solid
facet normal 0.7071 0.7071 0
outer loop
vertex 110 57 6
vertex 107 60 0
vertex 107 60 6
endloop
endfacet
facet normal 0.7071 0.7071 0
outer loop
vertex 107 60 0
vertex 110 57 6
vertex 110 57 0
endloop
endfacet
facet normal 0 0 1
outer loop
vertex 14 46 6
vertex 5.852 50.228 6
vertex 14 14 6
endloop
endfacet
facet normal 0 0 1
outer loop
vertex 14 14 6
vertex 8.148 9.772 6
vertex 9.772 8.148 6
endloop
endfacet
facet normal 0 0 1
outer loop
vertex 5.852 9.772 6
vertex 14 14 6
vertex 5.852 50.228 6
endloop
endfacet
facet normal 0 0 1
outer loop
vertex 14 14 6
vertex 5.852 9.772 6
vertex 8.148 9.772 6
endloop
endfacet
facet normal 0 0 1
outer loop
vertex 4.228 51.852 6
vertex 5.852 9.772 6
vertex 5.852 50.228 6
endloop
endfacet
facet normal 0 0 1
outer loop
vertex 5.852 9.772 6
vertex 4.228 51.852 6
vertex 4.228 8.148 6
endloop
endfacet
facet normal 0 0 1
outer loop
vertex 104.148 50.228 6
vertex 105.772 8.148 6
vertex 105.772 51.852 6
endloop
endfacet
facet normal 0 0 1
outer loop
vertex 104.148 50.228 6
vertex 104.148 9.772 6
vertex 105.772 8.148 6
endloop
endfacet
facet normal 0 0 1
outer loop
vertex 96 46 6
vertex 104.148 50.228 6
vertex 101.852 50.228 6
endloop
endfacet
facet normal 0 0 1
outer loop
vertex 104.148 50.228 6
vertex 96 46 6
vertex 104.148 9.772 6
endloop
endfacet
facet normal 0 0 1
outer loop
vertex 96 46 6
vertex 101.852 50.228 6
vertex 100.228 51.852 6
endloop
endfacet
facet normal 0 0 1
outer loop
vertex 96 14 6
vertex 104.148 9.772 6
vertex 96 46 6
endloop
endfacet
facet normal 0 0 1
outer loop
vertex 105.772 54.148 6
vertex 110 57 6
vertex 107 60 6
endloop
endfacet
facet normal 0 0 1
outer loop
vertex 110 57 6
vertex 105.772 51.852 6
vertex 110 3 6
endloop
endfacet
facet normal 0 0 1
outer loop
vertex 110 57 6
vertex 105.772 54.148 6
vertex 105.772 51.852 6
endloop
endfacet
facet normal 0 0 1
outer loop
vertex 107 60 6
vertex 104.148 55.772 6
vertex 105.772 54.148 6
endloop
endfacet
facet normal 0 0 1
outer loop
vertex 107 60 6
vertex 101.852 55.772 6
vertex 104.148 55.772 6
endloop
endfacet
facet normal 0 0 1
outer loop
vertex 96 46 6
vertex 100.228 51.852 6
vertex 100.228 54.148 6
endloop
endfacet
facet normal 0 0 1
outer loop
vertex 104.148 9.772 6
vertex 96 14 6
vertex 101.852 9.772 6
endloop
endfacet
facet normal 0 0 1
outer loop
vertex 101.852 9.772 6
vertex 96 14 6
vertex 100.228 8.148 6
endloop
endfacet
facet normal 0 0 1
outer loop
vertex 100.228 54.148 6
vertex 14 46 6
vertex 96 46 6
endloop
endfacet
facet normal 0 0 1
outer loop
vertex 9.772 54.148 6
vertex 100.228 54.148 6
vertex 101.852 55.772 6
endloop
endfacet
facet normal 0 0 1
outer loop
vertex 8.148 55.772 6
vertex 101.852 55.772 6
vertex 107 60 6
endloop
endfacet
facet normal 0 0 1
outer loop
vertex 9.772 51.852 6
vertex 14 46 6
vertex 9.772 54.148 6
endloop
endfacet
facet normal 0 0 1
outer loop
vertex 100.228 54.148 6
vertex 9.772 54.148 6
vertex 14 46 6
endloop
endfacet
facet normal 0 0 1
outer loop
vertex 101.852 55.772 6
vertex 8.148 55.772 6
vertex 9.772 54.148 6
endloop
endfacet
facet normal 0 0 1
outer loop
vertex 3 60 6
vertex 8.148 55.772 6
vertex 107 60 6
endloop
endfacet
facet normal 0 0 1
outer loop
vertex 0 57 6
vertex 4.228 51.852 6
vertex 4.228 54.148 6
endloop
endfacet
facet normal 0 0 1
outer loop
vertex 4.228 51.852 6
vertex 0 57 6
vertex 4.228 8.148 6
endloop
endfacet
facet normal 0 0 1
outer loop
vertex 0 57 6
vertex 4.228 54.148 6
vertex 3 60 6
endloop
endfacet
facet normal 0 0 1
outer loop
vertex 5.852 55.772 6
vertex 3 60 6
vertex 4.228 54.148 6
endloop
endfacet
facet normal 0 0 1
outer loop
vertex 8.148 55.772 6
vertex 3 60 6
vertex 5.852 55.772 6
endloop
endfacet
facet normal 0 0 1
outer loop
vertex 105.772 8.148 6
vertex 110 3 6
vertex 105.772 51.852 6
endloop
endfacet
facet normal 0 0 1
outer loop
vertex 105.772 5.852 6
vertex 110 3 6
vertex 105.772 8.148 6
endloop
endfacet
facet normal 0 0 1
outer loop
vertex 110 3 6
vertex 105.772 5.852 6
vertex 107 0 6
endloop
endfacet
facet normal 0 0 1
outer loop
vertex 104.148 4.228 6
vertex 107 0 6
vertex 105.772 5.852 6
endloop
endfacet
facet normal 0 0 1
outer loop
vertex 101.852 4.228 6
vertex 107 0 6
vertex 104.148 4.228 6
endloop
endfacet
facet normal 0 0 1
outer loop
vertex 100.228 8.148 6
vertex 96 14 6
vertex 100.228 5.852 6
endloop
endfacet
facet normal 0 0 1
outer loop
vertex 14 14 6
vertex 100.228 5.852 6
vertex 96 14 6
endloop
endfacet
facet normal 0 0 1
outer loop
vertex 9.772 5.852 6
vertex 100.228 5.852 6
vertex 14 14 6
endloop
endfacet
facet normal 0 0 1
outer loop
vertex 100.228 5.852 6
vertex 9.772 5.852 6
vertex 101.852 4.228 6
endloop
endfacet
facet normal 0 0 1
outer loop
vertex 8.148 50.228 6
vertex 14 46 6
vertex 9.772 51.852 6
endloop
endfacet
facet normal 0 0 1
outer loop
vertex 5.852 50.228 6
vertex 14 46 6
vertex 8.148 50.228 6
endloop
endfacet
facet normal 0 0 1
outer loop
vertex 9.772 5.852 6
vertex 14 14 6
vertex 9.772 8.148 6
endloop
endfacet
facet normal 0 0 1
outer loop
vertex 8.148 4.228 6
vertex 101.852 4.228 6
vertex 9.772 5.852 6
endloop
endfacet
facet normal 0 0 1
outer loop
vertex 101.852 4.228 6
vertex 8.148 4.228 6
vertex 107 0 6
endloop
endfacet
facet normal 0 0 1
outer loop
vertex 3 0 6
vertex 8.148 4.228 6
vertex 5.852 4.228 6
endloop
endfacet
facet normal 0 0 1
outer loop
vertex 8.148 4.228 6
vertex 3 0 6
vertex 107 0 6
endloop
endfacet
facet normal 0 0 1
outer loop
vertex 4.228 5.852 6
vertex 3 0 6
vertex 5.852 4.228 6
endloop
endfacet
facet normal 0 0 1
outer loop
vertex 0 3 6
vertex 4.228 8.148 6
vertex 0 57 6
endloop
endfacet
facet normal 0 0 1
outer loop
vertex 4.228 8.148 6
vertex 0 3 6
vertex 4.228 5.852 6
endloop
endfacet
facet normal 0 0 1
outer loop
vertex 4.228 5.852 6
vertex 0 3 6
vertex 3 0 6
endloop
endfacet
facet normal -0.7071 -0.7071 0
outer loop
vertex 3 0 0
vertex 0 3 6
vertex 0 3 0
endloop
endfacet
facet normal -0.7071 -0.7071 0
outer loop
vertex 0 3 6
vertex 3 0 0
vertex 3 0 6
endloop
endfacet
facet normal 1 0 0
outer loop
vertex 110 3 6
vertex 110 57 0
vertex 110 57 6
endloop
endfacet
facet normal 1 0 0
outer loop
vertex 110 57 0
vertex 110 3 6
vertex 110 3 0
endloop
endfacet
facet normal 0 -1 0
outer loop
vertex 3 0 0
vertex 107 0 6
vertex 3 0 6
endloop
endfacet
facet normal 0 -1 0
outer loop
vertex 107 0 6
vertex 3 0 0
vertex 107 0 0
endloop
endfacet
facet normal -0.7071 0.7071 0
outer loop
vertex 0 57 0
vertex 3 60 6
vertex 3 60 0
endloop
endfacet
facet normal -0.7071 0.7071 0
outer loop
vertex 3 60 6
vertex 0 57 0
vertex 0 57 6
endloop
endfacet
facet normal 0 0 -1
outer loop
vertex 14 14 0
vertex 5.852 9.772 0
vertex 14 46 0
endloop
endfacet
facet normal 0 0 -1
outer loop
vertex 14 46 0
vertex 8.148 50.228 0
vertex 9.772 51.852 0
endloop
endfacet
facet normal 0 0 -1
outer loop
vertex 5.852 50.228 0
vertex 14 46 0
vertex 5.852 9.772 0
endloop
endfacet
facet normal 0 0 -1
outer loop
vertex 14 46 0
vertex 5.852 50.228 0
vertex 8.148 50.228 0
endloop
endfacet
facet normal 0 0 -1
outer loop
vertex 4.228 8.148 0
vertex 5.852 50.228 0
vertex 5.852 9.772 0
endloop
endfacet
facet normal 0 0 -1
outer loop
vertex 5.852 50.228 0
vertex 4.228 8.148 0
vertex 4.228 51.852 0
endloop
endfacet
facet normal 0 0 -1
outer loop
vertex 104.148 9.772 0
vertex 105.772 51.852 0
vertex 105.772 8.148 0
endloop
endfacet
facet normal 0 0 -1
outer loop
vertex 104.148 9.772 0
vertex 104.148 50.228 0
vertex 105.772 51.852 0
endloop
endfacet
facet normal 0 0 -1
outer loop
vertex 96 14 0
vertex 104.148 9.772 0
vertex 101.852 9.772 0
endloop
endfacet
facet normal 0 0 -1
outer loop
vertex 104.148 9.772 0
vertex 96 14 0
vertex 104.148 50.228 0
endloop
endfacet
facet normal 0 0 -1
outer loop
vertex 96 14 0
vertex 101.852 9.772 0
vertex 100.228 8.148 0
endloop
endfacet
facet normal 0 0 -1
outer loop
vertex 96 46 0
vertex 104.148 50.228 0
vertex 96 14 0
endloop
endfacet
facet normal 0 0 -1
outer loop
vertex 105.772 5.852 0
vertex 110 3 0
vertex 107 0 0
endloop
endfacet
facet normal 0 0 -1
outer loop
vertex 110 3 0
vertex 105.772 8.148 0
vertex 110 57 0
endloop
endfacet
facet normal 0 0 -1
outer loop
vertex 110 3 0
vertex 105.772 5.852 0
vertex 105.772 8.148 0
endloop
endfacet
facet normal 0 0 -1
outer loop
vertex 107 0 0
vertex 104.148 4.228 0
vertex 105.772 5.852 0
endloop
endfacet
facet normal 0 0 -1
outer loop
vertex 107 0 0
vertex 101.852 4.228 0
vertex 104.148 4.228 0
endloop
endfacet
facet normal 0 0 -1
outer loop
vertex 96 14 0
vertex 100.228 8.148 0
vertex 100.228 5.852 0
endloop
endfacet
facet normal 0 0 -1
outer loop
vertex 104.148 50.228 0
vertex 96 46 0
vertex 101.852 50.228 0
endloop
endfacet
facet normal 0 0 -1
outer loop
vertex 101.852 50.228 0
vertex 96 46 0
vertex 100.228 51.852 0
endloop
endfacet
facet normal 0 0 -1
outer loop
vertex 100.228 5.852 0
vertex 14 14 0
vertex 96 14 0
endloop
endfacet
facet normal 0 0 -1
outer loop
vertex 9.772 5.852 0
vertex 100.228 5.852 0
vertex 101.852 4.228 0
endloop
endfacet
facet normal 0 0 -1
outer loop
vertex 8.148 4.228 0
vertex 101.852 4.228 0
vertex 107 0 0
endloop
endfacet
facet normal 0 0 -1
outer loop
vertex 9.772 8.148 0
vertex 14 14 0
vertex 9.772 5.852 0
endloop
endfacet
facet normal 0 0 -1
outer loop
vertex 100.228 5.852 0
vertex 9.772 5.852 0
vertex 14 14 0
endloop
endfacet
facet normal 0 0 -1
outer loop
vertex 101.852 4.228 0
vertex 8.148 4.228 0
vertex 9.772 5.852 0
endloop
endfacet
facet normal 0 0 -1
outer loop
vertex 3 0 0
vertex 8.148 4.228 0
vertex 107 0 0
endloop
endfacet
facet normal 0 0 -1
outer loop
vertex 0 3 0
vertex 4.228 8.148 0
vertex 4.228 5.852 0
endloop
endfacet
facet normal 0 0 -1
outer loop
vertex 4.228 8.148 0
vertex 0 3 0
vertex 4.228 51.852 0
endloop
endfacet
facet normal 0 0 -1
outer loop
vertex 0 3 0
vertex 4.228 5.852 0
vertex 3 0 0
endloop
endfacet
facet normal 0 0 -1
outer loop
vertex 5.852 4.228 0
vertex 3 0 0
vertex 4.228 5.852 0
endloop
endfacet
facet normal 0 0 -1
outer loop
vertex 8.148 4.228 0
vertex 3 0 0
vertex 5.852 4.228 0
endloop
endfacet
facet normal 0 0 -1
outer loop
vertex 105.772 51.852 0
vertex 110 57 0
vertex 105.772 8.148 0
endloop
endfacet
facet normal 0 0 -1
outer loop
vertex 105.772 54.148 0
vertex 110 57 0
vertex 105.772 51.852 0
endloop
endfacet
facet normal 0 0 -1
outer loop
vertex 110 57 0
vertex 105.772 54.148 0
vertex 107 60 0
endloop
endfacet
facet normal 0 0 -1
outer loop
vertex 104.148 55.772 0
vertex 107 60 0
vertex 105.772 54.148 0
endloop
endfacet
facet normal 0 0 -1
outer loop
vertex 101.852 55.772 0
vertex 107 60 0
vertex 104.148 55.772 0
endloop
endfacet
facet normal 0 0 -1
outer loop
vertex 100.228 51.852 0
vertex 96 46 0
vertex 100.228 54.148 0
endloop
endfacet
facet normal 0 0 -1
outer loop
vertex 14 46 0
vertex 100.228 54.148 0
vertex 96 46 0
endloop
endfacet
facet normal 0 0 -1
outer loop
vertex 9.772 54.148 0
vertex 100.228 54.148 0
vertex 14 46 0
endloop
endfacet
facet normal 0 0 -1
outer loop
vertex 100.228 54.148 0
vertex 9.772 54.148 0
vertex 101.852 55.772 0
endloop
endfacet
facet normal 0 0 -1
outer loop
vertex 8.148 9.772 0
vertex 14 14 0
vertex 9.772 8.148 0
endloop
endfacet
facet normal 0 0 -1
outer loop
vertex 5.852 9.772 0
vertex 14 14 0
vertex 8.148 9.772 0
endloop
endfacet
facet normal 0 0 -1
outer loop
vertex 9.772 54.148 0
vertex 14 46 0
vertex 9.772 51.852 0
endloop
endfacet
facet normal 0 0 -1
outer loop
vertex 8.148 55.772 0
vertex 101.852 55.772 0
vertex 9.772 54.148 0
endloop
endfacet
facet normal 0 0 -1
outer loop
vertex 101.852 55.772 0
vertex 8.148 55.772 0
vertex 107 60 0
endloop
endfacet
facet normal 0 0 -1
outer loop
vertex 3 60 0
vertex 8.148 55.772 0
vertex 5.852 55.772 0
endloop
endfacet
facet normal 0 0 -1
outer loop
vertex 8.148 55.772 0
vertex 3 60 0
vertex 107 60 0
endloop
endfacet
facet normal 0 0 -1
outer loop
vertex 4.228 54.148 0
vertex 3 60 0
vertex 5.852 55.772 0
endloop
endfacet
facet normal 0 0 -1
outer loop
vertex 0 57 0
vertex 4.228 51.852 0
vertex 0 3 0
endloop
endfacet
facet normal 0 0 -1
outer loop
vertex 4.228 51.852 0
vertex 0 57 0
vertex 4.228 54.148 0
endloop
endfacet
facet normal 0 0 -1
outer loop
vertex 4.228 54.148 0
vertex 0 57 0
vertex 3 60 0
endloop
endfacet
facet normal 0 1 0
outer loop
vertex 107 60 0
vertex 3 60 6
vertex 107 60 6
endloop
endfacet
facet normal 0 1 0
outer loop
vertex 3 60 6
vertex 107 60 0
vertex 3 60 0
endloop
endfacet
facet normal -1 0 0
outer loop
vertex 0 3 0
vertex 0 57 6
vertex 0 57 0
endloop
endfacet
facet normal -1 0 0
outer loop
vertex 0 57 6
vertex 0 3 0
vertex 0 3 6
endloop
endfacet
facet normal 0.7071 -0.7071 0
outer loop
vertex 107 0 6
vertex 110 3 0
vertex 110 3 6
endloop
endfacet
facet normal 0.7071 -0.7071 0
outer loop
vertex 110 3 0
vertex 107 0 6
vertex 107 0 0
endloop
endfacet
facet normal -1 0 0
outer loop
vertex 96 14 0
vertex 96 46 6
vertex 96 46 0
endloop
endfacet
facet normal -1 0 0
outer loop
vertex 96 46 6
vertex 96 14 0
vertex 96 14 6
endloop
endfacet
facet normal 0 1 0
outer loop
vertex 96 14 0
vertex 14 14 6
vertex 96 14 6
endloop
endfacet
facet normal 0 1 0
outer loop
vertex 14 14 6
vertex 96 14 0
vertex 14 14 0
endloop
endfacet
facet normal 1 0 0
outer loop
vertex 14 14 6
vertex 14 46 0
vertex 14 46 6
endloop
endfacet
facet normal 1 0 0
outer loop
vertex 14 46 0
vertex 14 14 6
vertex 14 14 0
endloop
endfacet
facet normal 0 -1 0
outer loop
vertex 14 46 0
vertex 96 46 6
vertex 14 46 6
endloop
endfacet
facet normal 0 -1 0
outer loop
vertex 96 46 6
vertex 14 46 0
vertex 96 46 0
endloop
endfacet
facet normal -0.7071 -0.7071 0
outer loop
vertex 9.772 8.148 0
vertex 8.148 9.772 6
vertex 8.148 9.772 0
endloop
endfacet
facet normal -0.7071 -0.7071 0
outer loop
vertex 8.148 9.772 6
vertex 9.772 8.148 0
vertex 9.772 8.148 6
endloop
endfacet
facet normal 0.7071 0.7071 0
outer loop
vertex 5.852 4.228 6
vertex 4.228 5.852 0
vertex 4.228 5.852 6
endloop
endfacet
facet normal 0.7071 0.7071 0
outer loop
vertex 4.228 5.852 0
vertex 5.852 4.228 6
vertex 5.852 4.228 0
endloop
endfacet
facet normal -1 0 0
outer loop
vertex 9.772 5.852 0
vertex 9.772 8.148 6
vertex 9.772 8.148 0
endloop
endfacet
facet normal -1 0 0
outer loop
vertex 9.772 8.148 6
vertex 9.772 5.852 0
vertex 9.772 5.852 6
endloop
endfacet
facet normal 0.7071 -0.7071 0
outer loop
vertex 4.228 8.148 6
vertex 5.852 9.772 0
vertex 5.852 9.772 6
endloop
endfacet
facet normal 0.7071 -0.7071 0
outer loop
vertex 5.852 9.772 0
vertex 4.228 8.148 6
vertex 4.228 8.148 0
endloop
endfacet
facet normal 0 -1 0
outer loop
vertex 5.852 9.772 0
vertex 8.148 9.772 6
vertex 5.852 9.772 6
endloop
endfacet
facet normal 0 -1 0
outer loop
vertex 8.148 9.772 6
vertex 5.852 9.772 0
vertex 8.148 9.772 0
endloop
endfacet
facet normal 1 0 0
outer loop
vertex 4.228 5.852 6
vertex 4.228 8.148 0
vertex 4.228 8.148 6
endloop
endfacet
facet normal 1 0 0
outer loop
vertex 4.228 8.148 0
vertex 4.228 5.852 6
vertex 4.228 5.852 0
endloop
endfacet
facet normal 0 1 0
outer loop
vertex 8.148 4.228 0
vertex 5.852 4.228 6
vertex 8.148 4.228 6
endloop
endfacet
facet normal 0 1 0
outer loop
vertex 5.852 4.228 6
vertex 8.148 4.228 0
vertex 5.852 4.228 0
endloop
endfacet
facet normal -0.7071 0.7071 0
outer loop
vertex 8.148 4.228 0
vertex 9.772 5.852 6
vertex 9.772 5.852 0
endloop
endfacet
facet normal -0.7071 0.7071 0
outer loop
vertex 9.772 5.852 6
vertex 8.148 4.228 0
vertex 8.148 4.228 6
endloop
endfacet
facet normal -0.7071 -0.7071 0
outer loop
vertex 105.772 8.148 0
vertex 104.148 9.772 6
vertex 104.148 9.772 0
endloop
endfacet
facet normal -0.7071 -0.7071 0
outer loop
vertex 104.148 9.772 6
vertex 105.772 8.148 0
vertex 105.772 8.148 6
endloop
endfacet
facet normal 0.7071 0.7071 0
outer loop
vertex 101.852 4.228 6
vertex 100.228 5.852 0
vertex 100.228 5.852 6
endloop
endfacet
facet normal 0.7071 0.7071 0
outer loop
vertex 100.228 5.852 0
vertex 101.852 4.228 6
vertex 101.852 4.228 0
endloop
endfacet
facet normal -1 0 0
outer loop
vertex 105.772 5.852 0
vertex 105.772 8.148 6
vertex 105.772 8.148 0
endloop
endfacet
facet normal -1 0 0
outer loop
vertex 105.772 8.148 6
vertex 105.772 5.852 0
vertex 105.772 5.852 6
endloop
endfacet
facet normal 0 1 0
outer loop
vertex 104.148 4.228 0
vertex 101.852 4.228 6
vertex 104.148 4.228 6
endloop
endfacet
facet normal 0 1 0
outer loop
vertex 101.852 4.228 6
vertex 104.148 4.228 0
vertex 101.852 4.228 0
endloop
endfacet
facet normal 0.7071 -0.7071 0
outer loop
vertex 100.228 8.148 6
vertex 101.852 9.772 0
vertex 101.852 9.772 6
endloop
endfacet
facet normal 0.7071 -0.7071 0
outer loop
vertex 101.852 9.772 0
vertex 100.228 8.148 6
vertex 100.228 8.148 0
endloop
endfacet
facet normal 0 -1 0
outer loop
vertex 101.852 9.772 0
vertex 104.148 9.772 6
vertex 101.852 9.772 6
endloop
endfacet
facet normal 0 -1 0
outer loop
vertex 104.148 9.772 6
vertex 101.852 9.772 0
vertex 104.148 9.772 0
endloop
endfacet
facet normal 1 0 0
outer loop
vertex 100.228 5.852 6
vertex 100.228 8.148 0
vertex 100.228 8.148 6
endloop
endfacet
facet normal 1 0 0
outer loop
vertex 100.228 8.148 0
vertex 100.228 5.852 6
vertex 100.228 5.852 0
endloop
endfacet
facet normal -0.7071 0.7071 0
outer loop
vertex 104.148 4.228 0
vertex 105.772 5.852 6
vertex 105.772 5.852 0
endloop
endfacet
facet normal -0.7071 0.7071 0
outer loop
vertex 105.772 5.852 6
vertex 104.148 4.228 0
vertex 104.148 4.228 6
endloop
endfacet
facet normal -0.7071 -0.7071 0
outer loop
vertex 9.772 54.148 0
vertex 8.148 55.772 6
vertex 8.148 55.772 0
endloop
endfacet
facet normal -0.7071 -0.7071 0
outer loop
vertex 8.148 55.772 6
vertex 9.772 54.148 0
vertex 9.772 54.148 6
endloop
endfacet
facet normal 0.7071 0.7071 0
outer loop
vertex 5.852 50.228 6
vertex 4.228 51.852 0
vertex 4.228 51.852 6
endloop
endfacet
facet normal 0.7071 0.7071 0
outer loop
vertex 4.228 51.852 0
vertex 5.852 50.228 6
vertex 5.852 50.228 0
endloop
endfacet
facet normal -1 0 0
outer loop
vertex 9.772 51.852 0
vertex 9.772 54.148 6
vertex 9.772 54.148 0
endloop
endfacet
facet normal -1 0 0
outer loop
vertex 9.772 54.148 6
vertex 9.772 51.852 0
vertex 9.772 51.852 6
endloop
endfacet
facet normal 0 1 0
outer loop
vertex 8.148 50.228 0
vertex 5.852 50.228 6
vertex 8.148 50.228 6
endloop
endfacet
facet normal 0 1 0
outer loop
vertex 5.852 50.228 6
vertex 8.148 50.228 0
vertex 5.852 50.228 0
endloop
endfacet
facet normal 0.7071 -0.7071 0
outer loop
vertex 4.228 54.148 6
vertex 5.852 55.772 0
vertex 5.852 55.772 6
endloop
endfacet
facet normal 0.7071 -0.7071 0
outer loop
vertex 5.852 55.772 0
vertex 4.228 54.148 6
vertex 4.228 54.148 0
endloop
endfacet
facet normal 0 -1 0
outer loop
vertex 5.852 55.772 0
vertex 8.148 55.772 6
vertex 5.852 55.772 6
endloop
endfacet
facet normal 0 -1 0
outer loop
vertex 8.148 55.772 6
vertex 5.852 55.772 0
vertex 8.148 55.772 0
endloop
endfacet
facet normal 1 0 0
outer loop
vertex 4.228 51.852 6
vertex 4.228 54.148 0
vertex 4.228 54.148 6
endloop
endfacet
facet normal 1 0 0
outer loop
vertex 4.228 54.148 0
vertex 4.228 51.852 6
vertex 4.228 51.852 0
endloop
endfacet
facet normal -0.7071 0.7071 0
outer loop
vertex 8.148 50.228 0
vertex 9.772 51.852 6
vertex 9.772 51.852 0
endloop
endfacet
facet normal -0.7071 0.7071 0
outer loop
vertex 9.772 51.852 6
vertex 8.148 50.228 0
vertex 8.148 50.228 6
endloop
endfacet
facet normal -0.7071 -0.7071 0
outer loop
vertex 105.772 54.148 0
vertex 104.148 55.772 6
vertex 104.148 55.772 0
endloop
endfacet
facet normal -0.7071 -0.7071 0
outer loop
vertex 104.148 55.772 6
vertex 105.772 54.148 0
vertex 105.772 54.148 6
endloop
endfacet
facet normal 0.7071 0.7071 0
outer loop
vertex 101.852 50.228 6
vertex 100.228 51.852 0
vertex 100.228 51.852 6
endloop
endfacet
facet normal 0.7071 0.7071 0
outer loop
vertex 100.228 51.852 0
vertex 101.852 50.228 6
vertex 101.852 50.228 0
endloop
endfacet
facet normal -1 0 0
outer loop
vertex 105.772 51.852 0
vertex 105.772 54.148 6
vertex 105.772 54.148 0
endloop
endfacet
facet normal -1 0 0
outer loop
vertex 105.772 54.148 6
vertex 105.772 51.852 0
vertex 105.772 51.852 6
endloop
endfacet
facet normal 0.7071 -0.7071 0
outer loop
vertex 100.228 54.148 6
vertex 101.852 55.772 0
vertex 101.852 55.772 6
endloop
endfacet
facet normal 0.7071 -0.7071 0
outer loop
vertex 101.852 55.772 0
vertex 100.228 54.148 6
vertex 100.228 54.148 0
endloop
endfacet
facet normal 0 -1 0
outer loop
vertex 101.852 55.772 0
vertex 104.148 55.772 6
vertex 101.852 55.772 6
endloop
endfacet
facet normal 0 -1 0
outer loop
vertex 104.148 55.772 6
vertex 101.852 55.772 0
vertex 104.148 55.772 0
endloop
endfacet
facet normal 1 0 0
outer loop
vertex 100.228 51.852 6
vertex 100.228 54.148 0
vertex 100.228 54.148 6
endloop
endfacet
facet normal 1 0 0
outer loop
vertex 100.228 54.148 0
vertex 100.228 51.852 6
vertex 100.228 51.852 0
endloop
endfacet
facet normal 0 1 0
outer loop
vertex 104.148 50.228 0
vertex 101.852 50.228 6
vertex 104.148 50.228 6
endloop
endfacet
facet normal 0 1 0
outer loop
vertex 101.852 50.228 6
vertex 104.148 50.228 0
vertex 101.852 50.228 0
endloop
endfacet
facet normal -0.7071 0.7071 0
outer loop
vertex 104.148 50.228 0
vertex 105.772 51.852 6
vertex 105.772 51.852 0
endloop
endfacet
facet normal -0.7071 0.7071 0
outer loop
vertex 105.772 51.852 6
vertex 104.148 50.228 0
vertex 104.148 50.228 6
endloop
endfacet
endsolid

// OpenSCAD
$fn = 32;

// ----------------------------------------------------------------------
// Frame plate: 110 x 60 frame, 14 mm rails
// ----------------------------------------------------------------------

// --- parameters (mm) ---
plate_l = 110;            // plate length, X
plate_w = 60;             // plate width, Y
plate_t = 6;              // plate thickness, Z (extrusion height)
corner_c = 3;             // corner chamfer
frame_bar = 14;           // frame rail width
bolt_r = 3;               // corner bolt window radius
bolt_inset = 7;           // bolt centre inset from the edges

win_l = plate_l - 2 * frame_bar;  // window length
win_w = plate_w - 2 * frame_bar;  // window width
bolt_d = 2 * bolt_r;  // corner hole diameter

profile = [[3, 0], [107, 0], [110, 3], [110, 57], [107, 60], [3, 60], [0, 57], [0, 3]];  // primary outline, 8 points, counter clockwise
void_1 = [[14, 14], [96, 14], [96, 46], [14, 46]];  // the window, 4 points
void_2 = [[9.772, 8.148], [8.148, 9.772], [5.852, 9.772], [4.228, 8.148], [4.228, 5.852], [5.852, 4.228], [8.148, 4.228], [9.772, 5.852]];  // corner bolt window, 8 points
void_3 = [[105.772, 8.148], [104.148, 9.772], [101.852, 9.772], [100.228, 8.148], [100.228, 5.852], [101.852, 4.228], [104.148, 4.228], [105.772, 5.852]];  // corner bolt window, 8 points
void_4 = [[9.772, 54.148], [8.148, 55.772], [5.852, 55.772], [4.228, 54.148], [4.228, 51.852], [5.852, 50.228], [8.148, 50.228], [9.772, 51.852]];  // corner bolt window, 8 points
void_5 = [[105.772, 54.148], [104.148, 55.772], [101.852, 55.772], [100.228, 54.148], [100.228, 51.852], [101.852, 50.228], [104.148, 50.228], [105.772, 51.852]];  // corner bolt window, 8 points

// --- the one profile operation ---
difference() {
  linear_extrude(height = plate_t) polygon(points = profile);
  translate([0, 0, -1])
    linear_extrude(height = plate_t + 2) polygon(points = void_1);
  translate([0, 0, -1])
    linear_extrude(height = plate_t + 2) polygon(points = void_2);
  translate([0, 0, -1])
    linear_extrude(height = plate_t + 2) polygon(points = void_3);
  translate([0, 0, -1])
    linear_extrude(height = plate_t + 2) polygon(points = void_4);
  translate([0, 0, -1])
    linear_extrude(height = plate_t + 2) polygon(points = void_5);
}
